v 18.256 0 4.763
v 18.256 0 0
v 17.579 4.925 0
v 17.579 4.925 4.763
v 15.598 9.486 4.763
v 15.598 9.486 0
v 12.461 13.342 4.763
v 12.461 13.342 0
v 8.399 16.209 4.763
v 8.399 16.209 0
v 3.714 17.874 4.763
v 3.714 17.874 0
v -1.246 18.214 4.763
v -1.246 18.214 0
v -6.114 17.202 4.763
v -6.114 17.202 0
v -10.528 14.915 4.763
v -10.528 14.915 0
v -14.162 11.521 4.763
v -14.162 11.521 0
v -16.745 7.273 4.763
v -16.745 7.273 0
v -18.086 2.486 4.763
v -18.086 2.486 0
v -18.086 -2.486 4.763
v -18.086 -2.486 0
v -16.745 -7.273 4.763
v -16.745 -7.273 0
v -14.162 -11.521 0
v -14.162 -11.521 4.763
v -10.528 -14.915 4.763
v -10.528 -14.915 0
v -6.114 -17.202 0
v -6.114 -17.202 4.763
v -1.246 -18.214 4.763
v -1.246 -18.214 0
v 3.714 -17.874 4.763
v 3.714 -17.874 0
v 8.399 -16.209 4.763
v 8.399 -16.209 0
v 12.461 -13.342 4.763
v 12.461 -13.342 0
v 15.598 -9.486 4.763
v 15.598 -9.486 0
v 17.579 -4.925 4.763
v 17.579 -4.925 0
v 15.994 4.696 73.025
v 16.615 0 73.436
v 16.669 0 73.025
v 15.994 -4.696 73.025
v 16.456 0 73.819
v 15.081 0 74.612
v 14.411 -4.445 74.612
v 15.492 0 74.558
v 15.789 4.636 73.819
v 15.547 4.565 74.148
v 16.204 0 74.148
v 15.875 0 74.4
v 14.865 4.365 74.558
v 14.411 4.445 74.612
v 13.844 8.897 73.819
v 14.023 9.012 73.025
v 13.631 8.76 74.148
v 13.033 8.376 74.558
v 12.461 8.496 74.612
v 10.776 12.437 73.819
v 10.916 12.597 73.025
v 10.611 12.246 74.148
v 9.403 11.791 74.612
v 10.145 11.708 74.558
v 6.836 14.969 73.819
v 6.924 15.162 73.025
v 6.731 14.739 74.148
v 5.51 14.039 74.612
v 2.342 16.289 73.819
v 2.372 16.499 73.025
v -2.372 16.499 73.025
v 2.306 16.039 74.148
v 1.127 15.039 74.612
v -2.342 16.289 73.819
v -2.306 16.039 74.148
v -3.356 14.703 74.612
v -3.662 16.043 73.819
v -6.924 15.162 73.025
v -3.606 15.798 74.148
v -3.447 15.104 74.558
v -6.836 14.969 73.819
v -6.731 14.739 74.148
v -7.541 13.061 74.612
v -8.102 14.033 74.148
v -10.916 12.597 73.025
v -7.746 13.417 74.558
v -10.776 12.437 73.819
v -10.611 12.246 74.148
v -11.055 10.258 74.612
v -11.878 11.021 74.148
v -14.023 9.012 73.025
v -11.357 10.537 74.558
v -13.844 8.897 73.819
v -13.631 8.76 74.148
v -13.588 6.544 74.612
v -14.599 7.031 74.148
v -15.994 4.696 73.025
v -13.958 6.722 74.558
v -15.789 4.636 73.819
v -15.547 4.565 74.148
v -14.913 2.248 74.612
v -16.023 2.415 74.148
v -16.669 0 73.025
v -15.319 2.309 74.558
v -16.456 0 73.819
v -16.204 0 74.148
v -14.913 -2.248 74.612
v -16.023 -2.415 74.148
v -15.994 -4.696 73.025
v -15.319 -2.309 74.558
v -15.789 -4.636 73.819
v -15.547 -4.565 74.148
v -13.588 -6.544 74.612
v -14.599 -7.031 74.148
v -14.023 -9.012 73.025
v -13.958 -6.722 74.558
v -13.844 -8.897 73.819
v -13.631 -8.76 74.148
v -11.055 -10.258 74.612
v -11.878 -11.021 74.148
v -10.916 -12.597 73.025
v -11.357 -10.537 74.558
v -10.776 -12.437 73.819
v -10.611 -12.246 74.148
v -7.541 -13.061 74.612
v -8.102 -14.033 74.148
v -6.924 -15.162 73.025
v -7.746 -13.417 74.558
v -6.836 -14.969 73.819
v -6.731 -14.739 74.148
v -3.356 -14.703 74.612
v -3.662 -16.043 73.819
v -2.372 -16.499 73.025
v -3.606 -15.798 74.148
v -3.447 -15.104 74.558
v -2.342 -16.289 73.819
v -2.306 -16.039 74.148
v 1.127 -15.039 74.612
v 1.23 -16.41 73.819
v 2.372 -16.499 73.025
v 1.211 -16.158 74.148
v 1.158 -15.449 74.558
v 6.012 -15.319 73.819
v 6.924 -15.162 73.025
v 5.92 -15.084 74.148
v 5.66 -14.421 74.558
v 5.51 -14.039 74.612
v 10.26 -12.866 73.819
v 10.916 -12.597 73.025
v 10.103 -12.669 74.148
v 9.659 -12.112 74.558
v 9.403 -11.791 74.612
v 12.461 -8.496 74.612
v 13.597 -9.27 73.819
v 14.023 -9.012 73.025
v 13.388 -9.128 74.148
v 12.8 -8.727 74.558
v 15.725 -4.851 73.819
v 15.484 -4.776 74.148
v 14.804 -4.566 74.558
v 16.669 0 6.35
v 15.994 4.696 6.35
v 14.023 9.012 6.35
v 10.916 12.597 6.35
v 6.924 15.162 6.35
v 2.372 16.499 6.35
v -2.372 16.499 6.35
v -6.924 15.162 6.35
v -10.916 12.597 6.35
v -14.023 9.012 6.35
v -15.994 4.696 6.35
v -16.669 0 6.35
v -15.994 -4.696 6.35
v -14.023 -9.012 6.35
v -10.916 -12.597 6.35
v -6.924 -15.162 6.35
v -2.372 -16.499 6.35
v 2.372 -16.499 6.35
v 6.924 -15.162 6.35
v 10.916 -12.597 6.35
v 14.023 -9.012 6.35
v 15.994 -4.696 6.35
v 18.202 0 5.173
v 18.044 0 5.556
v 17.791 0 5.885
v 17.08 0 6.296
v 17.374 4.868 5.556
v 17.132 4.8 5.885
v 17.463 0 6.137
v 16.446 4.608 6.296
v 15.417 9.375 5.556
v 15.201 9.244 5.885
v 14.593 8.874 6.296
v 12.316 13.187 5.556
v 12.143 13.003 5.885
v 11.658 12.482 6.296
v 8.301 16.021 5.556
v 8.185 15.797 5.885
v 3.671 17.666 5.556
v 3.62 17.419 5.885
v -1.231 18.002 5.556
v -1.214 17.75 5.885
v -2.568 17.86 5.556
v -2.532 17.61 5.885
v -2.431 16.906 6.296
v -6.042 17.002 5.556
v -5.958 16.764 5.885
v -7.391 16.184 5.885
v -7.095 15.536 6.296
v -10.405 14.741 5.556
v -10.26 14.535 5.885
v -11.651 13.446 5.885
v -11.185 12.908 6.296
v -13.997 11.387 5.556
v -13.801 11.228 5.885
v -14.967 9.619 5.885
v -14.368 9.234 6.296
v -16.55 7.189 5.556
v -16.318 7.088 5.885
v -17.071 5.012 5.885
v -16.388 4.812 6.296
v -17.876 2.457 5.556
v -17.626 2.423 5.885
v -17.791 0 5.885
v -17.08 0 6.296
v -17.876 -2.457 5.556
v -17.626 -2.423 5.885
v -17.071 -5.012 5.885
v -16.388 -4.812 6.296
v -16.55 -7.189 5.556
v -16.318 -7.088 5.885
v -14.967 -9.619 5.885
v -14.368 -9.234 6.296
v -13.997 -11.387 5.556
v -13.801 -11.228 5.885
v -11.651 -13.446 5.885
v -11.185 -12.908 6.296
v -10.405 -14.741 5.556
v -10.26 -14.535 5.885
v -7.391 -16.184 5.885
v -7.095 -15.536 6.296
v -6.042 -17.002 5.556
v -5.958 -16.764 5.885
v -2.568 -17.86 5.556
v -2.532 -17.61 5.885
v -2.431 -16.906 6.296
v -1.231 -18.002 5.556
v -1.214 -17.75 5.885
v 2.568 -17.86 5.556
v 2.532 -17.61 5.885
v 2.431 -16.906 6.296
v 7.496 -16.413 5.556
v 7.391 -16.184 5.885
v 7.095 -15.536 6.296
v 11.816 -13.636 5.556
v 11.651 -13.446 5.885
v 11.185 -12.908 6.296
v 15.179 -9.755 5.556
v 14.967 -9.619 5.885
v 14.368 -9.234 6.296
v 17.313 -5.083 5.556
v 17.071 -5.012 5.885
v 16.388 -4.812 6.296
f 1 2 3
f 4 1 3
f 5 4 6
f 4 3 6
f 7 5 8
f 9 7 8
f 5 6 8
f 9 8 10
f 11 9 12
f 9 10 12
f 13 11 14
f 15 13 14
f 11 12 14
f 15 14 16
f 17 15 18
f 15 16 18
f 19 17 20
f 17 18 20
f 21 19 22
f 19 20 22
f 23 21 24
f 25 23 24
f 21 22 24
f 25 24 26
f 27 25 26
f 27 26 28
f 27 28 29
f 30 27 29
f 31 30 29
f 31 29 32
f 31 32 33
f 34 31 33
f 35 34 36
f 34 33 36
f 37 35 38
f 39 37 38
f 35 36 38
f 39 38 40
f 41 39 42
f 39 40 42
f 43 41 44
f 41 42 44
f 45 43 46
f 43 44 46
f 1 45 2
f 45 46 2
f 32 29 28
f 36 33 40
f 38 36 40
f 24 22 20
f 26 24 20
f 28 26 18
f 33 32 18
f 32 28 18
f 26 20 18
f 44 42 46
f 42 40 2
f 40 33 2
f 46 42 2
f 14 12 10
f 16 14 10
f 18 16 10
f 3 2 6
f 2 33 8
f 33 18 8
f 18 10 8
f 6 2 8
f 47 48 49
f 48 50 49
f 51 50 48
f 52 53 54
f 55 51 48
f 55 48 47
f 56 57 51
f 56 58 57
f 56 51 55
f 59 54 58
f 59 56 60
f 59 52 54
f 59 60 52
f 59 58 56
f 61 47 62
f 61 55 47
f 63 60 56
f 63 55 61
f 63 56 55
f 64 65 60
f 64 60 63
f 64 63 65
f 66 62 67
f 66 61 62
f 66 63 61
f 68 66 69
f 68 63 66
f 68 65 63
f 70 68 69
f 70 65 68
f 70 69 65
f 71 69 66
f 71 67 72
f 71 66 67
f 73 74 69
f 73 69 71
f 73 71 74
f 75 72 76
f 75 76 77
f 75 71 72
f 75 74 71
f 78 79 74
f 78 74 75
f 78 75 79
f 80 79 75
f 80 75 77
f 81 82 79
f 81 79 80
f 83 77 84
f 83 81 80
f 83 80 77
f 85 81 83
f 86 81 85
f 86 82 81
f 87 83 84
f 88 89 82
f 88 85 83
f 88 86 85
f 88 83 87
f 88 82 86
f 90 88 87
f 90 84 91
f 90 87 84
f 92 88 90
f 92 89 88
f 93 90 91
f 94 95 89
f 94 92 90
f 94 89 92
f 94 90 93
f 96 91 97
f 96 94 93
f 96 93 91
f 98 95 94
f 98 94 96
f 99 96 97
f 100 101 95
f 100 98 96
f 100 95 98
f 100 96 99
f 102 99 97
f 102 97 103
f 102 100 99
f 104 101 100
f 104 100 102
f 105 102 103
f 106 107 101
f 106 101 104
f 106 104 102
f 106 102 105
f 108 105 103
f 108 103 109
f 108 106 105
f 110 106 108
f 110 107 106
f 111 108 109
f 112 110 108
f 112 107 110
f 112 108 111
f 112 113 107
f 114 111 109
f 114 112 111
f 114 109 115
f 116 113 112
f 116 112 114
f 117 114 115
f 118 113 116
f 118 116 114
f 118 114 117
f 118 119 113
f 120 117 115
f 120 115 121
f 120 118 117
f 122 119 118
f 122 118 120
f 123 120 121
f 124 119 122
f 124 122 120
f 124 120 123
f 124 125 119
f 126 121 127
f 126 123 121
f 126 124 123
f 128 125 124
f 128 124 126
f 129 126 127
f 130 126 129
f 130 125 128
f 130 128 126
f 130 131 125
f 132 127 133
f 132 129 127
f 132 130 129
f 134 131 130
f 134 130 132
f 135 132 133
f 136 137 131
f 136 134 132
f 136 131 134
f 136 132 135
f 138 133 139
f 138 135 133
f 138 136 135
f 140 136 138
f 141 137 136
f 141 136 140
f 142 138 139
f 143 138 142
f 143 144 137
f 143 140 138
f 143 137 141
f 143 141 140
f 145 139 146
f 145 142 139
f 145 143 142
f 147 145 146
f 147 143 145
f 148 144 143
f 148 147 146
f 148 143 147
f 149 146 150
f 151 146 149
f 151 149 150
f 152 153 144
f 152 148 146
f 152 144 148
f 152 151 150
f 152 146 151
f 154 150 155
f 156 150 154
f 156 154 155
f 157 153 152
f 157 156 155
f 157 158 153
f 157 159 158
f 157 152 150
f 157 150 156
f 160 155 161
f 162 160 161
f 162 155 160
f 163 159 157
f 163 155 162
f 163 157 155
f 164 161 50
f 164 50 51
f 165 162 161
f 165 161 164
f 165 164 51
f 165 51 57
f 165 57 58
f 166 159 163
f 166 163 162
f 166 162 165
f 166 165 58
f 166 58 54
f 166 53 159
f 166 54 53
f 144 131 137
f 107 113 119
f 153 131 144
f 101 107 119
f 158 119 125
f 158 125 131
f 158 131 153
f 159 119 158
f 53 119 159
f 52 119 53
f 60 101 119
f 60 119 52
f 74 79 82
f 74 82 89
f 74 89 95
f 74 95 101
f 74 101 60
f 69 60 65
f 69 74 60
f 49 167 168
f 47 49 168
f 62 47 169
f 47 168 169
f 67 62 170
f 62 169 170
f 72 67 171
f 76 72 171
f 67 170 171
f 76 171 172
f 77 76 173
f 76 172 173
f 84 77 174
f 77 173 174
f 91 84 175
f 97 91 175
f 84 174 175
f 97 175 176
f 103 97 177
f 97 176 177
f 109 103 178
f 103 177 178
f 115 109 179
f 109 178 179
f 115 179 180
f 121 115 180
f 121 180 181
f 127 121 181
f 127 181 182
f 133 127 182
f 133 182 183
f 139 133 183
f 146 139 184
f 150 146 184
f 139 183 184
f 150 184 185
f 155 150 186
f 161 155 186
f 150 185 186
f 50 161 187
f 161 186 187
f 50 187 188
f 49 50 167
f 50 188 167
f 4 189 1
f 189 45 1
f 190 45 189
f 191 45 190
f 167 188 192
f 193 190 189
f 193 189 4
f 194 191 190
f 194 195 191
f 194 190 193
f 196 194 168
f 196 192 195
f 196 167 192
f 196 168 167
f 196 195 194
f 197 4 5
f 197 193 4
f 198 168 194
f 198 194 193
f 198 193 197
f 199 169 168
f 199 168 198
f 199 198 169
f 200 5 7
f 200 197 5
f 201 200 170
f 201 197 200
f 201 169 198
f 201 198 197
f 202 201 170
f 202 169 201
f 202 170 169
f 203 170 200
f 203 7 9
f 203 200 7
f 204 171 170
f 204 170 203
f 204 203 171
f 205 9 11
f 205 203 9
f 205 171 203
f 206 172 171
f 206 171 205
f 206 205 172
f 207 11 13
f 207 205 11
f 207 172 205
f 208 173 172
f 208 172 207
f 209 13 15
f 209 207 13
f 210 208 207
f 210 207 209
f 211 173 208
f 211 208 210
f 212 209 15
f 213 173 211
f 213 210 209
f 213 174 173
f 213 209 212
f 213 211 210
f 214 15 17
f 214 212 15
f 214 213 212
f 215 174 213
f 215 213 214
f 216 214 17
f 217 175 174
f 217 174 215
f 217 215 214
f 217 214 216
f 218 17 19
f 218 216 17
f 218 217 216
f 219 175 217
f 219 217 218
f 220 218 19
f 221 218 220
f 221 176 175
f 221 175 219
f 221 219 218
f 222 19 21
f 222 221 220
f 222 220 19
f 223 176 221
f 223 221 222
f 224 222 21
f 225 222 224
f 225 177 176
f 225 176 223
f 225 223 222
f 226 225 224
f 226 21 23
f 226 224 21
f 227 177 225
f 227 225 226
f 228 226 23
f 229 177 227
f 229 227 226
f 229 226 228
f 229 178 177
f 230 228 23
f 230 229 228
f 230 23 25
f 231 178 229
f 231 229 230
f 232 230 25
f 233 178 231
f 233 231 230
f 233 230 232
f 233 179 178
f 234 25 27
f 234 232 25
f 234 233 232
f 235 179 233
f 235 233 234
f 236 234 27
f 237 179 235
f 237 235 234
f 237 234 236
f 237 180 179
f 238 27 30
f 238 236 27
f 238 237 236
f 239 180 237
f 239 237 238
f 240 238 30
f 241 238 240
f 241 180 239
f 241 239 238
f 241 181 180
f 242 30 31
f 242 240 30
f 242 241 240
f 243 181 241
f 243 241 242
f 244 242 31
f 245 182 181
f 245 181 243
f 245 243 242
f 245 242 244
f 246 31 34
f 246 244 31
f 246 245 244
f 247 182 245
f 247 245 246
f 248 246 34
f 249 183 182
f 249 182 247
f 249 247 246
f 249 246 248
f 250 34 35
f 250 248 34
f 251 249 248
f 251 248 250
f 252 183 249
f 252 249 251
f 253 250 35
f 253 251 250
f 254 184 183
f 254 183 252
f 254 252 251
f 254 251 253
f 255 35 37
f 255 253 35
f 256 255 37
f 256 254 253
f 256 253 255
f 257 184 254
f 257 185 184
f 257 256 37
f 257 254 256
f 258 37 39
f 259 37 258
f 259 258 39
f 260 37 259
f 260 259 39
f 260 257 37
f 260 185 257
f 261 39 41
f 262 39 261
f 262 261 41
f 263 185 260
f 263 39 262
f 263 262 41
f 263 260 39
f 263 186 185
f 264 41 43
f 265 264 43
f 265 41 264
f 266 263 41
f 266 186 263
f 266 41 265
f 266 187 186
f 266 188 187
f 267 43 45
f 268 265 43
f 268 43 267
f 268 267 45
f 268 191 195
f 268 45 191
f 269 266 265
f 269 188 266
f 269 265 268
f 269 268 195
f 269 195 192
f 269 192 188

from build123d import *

# Parameters (mm, degrees)
F0_R     = 18.25625
F1_DEPTH = 6.35
F2_R     = 16.66875
F3_DEPTH = 68.2625
F4_R     = 1.58749


# Not quite as in the source:
# - a fillet or chamfer is up to 0.001 mm smaller than in the source, because OpenCascade refuses the exact size


with BuildPart() as f1:
    # F0 (on Top) → F1 (new body)
    with BuildSketch(Plane.XY):
        Circle(F0_R)
    extrude(amount=F1_DEPTH)

    # F2 (on face) → F3 (join)
    with BuildSketch(Plane.XY.offset(6.35)):
        Circle(F2_R)
    extrude(amount=F3_DEPTH)

    # F4 (radius 1.5875 in the source; OpenCascade refuses exactly that, so slightly less here)
    f4_edges = [f1.edges().sort_by_distance(p)[0] for p in [
        (-18.25625, 0, 6.35),
        (-16.66875, 0, 74.6125),
    ]]
    fillet(f4_edges, radius=F4_R)


solid = f1.part
